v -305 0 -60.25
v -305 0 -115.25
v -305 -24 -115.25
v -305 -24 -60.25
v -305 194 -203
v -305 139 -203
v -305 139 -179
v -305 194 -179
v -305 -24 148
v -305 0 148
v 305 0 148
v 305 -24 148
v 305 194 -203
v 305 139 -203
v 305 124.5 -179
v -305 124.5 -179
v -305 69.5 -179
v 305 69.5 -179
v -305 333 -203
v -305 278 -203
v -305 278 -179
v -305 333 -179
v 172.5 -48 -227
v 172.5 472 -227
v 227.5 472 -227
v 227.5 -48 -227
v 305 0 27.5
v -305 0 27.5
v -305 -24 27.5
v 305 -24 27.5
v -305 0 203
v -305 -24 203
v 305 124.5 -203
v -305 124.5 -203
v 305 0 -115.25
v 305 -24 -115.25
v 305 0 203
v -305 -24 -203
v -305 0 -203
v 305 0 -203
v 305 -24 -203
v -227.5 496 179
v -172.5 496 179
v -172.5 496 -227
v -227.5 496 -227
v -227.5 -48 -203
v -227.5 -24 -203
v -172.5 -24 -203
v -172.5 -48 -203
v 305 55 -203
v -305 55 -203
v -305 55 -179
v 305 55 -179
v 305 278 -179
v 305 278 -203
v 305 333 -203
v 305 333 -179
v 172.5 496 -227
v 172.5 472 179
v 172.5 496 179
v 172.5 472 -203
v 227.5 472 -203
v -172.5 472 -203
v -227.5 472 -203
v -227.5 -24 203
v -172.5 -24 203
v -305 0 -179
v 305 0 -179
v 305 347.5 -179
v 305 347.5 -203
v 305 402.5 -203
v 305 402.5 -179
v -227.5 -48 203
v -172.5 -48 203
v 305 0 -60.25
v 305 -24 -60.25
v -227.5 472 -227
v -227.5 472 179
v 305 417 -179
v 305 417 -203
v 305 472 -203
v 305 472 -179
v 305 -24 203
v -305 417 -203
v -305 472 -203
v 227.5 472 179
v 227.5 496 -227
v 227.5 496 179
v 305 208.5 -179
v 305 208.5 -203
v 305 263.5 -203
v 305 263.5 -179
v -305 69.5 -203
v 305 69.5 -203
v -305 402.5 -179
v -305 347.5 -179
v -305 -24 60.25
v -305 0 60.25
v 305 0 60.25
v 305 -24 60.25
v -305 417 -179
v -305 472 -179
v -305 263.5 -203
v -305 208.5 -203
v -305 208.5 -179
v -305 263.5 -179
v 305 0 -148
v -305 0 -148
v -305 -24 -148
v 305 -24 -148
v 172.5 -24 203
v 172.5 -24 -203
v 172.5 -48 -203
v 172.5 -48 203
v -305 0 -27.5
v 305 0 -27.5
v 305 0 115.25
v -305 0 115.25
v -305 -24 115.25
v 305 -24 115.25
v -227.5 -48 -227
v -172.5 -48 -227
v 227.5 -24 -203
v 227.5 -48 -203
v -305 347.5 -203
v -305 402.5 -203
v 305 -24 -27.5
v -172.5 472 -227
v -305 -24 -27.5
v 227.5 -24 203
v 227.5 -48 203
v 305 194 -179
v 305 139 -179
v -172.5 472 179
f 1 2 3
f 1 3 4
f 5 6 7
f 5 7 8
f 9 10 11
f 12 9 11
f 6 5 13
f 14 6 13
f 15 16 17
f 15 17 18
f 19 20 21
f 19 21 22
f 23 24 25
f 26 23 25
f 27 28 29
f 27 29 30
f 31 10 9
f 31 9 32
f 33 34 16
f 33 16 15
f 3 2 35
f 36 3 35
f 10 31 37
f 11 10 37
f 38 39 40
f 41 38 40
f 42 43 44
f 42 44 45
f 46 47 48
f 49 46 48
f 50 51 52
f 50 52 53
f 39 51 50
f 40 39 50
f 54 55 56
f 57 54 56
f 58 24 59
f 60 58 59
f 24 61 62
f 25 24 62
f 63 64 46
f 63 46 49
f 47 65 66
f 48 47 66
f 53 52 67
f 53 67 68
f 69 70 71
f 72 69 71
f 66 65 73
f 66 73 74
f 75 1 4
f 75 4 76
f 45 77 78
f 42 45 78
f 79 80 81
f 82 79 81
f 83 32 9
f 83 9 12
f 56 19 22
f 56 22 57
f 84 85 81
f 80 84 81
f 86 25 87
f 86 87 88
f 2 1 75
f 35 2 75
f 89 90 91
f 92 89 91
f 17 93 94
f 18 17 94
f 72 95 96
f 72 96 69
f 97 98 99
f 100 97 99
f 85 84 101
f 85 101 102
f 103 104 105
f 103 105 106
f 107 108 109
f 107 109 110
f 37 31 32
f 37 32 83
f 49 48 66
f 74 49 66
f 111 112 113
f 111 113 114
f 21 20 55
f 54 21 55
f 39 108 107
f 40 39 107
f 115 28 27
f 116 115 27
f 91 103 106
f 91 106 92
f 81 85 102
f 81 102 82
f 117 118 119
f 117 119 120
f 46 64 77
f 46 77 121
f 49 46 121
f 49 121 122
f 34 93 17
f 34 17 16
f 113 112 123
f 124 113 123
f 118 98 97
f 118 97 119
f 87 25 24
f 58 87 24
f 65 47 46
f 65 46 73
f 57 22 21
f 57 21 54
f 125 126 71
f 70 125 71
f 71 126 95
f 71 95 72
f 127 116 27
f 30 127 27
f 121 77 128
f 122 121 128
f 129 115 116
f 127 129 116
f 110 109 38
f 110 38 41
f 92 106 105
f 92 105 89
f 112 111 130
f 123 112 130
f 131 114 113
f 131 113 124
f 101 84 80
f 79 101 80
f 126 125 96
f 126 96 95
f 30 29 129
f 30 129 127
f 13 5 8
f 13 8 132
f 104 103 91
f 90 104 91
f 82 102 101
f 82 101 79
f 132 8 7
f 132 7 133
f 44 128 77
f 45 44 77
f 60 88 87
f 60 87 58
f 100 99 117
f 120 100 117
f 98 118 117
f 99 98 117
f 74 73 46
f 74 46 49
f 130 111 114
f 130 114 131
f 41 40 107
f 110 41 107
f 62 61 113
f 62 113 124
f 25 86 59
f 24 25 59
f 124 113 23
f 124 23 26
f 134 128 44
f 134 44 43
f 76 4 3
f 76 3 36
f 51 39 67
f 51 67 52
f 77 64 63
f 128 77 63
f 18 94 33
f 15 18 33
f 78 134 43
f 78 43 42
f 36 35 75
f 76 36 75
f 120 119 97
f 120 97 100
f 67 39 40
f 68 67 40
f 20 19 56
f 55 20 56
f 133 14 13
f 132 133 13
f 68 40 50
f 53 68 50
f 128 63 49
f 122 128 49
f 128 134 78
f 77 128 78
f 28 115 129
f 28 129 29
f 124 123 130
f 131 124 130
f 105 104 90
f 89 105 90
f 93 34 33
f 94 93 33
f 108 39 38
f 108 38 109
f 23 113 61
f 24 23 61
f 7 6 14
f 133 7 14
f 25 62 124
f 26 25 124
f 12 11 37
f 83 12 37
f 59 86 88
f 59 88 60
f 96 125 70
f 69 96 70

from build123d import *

# Parameters (mm, degrees)
F2_W      = 610
F2_H      = 55
F3_DEPTH  = 24
F4_W      = 55
F4_H      = 406
F5_DEPTH  = 24
F6_W      = 55
F6_H      = 496
F6_H_2    = 24
F7_DEPTH  = 24
F6_H_3    = 520
F8_W      = 55
F8_H      = 406
F9_DEPTH  = 24
F10_W     = 610
F10_H     = 55
F11_DEPTH = 24


with BuildPart() as f3:
    # F2 (on Front) → F3 (new body)
    with BuildSketch(Plane.XZ):
        with Locations((0, 175.5)):
            Rectangle(F2_W, F2_H)
    extrude(amount=F3_DEPTH)


with BuildPart() as f3b:
    # F2 (on Front) → F3, piece 2 (new body)
    with BuildSketch(Plane.XZ):
        with Locations((0, 87.75)):
            Rectangle(F2_W, F2_H)
    extrude(amount=F3_DEPTH)


with BuildPart() as f3c:
    # F2 (on Front) → F3, piece 3 (new body)
    with BuildSketch(Plane.XZ):
        Rectangle(F2_W, F2_H)
    extrude(amount=F3_DEPTH)


with BuildPart() as f3d:
    # F2 (on Front) → F3, piece 4 (new body)
    with BuildSketch(Plane.XZ):
        with Locations((0, -175.5)):
            Rectangle(F2_W, F2_H)
    extrude(amount=F3_DEPTH)


with BuildPart() as f3e:
    # F2 (on Front) → F3, piece 5 (new body)
    with BuildSketch(Plane.XZ):
        with Locations((0, -87.75)):
            Rectangle(F2_W, F2_H)
    extrude(amount=F3_DEPTH)


with BuildPart() as f5:
    # F4 (on face) → F5 (new body)
    with BuildSketch(Plane.XZ.offset(24)):
        with Locations((-200, 0)):
            Rectangle(F4_W, F4_H)
    extrude(amount=F5_DEPTH)


with BuildPart() as f5b:
    # F4 (on face) → F5, piece 2 (new body)
    with BuildSketch(Plane.XZ.offset(24)):
        with Locations((200, 0)):
            Rectangle(F4_W, F4_H)
    extrude(amount=F5_DEPTH)


with BuildPart() as f7:
    # F6 (on face) → F7 (new body)
    with BuildSketch(Plane(origin=(0, 0, -203), x_dir=(1, 0, 0), z_dir=(0, 0, -1))):
        with Locations((200, -224)):
            Rectangle(F6_W, F6_H)
        with Locations((200, 36)):
            Rectangle(F6_W, F6_H_2)
    extrude(amount=F7_DEPTH)


with BuildPart() as f7b:
    # F6 (on face) → F7, piece 2 (new body)
    with BuildSketch(Plane(origin=(0, 0, -203), x_dir=(1, 0, 0), z_dir=(0, 0, -1))):
        with Locations((-200, -212)):
            Rectangle(F6_W, F6_H_3)
    extrude(amount=F7_DEPTH)


with BuildPart() as f9:
    # F8 (on face) → F9 (new body)
    with BuildSketch(Plane(origin=(0, 472, 0), x_dir=(-1, 0, 0), z_dir=(0, 1, 0))):
        with Locations((-200, -24)):
            Rectangle(F8_W, F8_H)
    extrude(amount=F9_DEPTH)


with BuildPart() as f9b:
    # F8 (on face) → F9, piece 2 (new body)
    with BuildSketch(Plane(origin=(0, 472, 0), x_dir=(-1, 0, 0), z_dir=(0, 1, 0))):
        with Locations((200, -24)):
            Rectangle(F8_W, F8_H)
    extrude(amount=F9_DEPTH)


with BuildPart() as f11:
    # F10 (on face) → F11 (new body)
    with BuildSketch(Plane.XY.offset(-203)):
        with Locations((0, 27.5)):
            Rectangle(F10_W, F10_H)
    extrude(amount=F11_DEPTH)


with BuildPart() as f11b:
    # F10 (on face) → F11, piece 2 (new body)
    with BuildSketch(Plane.XY.offset(-203)):
        with Locations((0, 97)):
            Rectangle(F10_W, F10_H)
    extrude(amount=F11_DEPTH)


with BuildPart() as f11c:
    # F10 (on face) → F11, piece 3 (new body)
    with BuildSketch(Plane.XY.offset(-203)):
        with Locations((0, 166.5)):
            Rectangle(F10_W, F10_H)
    extrude(amount=F11_DEPTH)


with BuildPart() as f11d:
    # F10 (on face) → F11, piece 4 (new body)
    with BuildSketch(Plane.XY.offset(-203)):
        with Locations((0, 236)):
            Rectangle(F10_W, F10_H)
    extrude(amount=F11_DEPTH)


with BuildPart() as f11e:
    # F10 (on face) → F11, piece 5 (new body)
    with BuildSketch(Plane.XY.offset(-203)):
        with Locations((0, 305.5)):
            Rectangle(F10_W, F10_H)
    extrude(amount=F11_DEPTH)


with BuildPart() as f11f:
    # F10 (on face) → F11, piece 6 (new body)
    with BuildSketch(Plane.XY.offset(-203)):
        with Locations((0, 375)):
            Rectangle(F10_W, F10_H)
    extrude(amount=F11_DEPTH)


with BuildPart() as f11g:
    # F10 (on face) → F11, piece 7 (new body)
    with BuildSketch(Plane.XY.offset(-203)):
        with Locations((0, 444.5)):
            Rectangle(F10_W, F10_H)
    extrude(amount=F11_DEPTH)


solid = Compound([f3.part, f3b.part, f3c.part, f3d.part, f3e.part, f5.part, f5b.part, f7.part, f7b.part, f9.part, f9b.part, f11.part, f11b.part, f11c.part, f11d.part, f11e.part, f11f.part, f11g.part])
